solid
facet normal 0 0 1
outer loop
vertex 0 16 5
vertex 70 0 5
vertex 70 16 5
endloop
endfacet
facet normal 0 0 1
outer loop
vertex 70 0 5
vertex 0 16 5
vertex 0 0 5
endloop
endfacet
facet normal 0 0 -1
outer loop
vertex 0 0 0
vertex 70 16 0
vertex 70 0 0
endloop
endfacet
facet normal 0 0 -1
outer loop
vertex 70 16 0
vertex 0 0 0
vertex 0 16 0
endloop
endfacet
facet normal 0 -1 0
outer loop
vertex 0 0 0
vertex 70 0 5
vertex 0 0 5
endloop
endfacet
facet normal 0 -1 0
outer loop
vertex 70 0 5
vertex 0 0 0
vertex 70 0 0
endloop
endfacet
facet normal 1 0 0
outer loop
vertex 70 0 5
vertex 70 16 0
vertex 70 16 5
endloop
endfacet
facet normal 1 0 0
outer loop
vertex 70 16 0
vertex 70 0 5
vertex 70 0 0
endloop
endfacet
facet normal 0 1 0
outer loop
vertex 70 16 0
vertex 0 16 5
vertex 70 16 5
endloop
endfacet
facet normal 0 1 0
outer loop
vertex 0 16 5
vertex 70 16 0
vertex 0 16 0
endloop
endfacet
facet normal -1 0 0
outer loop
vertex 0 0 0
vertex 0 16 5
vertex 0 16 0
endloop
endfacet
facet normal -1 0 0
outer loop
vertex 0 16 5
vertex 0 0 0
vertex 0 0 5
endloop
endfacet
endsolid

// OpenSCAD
//Author: Chris Correll
//Date: 8/21/2022
//Description: Project 0 tactile floor marker v0 fits a velcro command strip

cube([70, 16, 5]);
